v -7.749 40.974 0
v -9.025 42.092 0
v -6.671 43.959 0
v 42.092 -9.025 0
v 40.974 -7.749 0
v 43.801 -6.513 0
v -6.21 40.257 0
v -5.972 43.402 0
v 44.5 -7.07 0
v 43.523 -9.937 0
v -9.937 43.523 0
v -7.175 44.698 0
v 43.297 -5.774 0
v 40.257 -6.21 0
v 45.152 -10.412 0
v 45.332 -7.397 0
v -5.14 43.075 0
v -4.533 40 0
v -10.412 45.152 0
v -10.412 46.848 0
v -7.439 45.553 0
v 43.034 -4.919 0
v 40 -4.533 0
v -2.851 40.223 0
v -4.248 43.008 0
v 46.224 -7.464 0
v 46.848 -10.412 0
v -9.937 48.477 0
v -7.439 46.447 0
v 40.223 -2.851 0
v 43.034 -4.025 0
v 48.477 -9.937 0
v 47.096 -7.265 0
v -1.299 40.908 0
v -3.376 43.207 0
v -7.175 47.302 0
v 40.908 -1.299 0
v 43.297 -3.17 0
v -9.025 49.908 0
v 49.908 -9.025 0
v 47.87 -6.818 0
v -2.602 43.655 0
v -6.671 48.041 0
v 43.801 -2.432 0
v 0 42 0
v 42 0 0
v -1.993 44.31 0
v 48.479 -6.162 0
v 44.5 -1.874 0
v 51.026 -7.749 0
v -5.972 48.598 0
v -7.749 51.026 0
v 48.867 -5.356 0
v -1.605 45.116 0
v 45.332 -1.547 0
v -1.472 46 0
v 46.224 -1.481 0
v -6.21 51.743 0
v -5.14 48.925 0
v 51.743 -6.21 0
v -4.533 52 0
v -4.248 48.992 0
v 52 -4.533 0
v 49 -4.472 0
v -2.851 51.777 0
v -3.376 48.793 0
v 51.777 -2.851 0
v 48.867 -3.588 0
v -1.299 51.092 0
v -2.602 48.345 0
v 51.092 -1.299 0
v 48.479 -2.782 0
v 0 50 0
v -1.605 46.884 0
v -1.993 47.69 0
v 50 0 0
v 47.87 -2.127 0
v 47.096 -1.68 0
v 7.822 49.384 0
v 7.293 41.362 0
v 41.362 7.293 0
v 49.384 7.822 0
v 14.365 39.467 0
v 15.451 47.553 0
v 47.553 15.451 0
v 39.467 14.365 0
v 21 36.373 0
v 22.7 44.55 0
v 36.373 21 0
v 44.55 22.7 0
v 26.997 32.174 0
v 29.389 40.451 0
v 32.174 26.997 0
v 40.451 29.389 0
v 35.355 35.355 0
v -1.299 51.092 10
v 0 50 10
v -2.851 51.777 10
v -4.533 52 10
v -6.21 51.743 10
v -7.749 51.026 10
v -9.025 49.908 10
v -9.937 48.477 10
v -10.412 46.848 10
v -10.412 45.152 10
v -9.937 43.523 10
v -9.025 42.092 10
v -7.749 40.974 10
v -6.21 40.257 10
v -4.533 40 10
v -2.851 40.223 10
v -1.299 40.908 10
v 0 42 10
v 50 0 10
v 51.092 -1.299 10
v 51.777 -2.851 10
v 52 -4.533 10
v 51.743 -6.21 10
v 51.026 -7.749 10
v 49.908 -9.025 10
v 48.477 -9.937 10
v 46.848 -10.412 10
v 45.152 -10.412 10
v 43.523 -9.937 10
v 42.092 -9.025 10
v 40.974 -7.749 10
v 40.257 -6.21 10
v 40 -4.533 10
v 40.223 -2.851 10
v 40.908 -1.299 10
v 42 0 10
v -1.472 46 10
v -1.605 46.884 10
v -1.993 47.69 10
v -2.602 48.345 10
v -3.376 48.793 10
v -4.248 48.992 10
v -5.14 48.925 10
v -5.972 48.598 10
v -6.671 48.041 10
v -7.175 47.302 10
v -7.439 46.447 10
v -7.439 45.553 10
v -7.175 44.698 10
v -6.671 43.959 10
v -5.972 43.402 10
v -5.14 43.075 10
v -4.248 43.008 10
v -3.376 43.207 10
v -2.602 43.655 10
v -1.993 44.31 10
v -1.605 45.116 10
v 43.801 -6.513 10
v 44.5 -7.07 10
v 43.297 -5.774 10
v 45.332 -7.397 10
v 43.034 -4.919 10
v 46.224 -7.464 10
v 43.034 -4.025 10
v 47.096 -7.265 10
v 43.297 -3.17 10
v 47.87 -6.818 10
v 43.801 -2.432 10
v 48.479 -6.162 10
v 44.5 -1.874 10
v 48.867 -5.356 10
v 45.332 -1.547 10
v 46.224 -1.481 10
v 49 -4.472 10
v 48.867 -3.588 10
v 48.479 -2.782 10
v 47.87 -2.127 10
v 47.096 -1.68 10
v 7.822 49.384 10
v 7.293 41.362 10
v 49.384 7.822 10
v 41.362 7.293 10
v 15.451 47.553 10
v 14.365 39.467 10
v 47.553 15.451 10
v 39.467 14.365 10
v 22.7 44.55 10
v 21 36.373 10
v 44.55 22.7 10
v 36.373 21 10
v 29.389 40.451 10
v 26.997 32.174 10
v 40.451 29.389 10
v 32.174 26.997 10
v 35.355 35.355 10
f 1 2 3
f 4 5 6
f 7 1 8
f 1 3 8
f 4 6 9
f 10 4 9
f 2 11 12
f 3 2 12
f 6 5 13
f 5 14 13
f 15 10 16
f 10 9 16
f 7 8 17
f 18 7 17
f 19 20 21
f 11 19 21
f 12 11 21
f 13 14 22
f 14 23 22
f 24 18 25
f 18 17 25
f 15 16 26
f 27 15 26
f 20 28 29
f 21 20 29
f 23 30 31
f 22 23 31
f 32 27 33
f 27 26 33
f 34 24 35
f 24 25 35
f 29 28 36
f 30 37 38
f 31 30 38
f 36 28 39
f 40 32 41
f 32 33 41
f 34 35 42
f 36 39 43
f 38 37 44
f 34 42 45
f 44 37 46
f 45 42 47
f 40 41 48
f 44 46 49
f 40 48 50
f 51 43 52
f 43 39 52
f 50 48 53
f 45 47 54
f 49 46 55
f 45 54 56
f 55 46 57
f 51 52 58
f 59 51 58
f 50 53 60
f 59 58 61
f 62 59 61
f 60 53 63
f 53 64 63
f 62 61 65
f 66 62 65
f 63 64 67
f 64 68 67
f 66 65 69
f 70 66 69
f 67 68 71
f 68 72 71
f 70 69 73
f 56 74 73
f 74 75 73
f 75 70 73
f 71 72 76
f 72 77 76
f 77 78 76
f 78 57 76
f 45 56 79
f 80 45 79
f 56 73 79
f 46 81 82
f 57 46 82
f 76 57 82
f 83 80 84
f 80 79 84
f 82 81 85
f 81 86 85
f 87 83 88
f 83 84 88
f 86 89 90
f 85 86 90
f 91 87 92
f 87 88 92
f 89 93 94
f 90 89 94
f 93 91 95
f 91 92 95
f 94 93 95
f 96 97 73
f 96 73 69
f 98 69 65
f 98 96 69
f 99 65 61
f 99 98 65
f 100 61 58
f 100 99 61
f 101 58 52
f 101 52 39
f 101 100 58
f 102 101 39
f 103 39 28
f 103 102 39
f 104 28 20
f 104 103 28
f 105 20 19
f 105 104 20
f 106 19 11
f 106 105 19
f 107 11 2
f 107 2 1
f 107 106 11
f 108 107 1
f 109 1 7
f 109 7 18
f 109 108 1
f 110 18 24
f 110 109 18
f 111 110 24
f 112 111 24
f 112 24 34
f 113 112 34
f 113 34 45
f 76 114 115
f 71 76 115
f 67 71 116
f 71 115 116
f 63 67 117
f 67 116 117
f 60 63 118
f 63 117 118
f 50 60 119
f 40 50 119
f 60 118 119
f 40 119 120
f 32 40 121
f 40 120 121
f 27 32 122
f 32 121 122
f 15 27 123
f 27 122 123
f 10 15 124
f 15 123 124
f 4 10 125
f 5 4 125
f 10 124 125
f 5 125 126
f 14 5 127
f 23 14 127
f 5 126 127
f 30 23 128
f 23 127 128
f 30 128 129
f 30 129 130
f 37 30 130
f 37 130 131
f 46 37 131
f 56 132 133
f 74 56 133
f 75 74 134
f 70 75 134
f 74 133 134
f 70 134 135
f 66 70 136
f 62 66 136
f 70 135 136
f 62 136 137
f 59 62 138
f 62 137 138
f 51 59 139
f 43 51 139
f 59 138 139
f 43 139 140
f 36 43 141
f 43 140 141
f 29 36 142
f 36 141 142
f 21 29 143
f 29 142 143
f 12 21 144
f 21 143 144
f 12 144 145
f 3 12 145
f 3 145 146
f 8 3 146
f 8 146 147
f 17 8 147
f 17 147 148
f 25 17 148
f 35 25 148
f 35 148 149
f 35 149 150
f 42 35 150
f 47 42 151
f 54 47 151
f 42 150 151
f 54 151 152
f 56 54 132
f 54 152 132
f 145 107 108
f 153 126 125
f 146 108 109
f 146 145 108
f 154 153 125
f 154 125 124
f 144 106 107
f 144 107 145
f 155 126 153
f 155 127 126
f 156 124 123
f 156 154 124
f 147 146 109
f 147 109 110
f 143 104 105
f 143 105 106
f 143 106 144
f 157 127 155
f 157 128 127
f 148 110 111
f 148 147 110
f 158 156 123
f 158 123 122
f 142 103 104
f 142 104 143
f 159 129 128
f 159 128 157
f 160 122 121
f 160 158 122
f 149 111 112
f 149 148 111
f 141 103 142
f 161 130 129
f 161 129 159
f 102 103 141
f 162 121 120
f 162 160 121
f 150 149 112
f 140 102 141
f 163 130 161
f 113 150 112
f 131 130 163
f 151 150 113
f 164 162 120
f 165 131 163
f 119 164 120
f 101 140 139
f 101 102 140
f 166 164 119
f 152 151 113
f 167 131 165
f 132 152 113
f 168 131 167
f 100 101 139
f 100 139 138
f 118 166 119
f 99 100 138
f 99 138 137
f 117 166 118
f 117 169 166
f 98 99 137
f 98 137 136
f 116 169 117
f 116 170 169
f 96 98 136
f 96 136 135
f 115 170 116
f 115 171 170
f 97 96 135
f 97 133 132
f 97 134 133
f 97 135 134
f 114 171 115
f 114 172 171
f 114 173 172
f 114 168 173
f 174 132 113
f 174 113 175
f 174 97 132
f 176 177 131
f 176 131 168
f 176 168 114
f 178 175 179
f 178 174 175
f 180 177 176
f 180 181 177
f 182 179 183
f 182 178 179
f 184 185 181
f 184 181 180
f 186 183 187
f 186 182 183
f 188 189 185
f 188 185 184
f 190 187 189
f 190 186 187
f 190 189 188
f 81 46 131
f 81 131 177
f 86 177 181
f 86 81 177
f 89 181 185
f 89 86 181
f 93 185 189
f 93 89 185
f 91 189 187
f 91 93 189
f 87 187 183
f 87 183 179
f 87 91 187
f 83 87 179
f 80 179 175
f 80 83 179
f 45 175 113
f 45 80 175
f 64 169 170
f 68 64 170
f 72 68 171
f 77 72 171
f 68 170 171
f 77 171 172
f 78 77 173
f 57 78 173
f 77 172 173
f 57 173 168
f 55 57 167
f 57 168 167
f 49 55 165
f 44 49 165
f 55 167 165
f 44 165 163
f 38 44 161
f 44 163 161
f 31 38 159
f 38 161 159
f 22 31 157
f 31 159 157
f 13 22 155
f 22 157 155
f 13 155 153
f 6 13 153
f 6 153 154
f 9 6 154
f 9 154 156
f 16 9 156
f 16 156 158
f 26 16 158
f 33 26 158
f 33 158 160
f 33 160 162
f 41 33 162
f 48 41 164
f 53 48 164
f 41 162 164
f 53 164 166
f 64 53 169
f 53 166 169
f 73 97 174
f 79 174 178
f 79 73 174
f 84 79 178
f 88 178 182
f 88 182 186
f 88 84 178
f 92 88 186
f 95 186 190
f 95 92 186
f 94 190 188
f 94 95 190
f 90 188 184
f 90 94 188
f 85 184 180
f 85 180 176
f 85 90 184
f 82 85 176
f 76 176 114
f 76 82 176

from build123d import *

# Parameters (mm, degrees)
BOSS_EXTRU_1_DEPTH      = 10
BOSS_EXTRU_2_DEPTH      = 10
ESQUISSE3_R             = 3
ENL_V_MAT_EXTRU_1_DEPTH = 10


with BuildPart() as part:
    # Esquisse1 → Boss.-Extru.1 (new body)
    with BuildSketch(Plane.XY):
        with BuildLine():
            Line((0, 42), (0, 50))
            ThreePointArc((0, 50), (35.355339059, 35.355339059), (50, 0))
            Line((50, 0), (42, 0))
            ThreePointArc((42, 0), (29.69848481, 29.69848481), (0, 42))
        make_face()
    extrude(amount=BOSS_EXTRU_1_DEPTH)

    # Esquisse2 → Boss.-Extru.2 (add)
    with BuildSketch(Plane.XY.offset(10)):
        with BuildLine():
            Line((0, 42), (0, 50))
            ThreePointArc((0, 50), (-10.472135955, 46), (0, 42))
        make_face()
        with BuildLine():
            Line((42, 0), (50, 0))
            ThreePointArc((50, 0), (46, -10.472135955), (42, 0))
        make_face()
    extrude(amount=-BOSS_EXTRU_2_DEPTH)

    # Esquisse3 → Enlèv. mat.-Extru.1 (cut)
    with BuildSketch(Plane.XY.offset(10)):
        with Locations((46, -4.472135955)):
            Circle(ESQUISSE3_R)
        with Locations((-4.472135955, 46)):
            Circle(ESQUISSE3_R)
    extrude(amount=-ENL_V_MAT_EXTRU_1_DEPTH, mode=Mode.SUBTRACT)


solid = part.part
